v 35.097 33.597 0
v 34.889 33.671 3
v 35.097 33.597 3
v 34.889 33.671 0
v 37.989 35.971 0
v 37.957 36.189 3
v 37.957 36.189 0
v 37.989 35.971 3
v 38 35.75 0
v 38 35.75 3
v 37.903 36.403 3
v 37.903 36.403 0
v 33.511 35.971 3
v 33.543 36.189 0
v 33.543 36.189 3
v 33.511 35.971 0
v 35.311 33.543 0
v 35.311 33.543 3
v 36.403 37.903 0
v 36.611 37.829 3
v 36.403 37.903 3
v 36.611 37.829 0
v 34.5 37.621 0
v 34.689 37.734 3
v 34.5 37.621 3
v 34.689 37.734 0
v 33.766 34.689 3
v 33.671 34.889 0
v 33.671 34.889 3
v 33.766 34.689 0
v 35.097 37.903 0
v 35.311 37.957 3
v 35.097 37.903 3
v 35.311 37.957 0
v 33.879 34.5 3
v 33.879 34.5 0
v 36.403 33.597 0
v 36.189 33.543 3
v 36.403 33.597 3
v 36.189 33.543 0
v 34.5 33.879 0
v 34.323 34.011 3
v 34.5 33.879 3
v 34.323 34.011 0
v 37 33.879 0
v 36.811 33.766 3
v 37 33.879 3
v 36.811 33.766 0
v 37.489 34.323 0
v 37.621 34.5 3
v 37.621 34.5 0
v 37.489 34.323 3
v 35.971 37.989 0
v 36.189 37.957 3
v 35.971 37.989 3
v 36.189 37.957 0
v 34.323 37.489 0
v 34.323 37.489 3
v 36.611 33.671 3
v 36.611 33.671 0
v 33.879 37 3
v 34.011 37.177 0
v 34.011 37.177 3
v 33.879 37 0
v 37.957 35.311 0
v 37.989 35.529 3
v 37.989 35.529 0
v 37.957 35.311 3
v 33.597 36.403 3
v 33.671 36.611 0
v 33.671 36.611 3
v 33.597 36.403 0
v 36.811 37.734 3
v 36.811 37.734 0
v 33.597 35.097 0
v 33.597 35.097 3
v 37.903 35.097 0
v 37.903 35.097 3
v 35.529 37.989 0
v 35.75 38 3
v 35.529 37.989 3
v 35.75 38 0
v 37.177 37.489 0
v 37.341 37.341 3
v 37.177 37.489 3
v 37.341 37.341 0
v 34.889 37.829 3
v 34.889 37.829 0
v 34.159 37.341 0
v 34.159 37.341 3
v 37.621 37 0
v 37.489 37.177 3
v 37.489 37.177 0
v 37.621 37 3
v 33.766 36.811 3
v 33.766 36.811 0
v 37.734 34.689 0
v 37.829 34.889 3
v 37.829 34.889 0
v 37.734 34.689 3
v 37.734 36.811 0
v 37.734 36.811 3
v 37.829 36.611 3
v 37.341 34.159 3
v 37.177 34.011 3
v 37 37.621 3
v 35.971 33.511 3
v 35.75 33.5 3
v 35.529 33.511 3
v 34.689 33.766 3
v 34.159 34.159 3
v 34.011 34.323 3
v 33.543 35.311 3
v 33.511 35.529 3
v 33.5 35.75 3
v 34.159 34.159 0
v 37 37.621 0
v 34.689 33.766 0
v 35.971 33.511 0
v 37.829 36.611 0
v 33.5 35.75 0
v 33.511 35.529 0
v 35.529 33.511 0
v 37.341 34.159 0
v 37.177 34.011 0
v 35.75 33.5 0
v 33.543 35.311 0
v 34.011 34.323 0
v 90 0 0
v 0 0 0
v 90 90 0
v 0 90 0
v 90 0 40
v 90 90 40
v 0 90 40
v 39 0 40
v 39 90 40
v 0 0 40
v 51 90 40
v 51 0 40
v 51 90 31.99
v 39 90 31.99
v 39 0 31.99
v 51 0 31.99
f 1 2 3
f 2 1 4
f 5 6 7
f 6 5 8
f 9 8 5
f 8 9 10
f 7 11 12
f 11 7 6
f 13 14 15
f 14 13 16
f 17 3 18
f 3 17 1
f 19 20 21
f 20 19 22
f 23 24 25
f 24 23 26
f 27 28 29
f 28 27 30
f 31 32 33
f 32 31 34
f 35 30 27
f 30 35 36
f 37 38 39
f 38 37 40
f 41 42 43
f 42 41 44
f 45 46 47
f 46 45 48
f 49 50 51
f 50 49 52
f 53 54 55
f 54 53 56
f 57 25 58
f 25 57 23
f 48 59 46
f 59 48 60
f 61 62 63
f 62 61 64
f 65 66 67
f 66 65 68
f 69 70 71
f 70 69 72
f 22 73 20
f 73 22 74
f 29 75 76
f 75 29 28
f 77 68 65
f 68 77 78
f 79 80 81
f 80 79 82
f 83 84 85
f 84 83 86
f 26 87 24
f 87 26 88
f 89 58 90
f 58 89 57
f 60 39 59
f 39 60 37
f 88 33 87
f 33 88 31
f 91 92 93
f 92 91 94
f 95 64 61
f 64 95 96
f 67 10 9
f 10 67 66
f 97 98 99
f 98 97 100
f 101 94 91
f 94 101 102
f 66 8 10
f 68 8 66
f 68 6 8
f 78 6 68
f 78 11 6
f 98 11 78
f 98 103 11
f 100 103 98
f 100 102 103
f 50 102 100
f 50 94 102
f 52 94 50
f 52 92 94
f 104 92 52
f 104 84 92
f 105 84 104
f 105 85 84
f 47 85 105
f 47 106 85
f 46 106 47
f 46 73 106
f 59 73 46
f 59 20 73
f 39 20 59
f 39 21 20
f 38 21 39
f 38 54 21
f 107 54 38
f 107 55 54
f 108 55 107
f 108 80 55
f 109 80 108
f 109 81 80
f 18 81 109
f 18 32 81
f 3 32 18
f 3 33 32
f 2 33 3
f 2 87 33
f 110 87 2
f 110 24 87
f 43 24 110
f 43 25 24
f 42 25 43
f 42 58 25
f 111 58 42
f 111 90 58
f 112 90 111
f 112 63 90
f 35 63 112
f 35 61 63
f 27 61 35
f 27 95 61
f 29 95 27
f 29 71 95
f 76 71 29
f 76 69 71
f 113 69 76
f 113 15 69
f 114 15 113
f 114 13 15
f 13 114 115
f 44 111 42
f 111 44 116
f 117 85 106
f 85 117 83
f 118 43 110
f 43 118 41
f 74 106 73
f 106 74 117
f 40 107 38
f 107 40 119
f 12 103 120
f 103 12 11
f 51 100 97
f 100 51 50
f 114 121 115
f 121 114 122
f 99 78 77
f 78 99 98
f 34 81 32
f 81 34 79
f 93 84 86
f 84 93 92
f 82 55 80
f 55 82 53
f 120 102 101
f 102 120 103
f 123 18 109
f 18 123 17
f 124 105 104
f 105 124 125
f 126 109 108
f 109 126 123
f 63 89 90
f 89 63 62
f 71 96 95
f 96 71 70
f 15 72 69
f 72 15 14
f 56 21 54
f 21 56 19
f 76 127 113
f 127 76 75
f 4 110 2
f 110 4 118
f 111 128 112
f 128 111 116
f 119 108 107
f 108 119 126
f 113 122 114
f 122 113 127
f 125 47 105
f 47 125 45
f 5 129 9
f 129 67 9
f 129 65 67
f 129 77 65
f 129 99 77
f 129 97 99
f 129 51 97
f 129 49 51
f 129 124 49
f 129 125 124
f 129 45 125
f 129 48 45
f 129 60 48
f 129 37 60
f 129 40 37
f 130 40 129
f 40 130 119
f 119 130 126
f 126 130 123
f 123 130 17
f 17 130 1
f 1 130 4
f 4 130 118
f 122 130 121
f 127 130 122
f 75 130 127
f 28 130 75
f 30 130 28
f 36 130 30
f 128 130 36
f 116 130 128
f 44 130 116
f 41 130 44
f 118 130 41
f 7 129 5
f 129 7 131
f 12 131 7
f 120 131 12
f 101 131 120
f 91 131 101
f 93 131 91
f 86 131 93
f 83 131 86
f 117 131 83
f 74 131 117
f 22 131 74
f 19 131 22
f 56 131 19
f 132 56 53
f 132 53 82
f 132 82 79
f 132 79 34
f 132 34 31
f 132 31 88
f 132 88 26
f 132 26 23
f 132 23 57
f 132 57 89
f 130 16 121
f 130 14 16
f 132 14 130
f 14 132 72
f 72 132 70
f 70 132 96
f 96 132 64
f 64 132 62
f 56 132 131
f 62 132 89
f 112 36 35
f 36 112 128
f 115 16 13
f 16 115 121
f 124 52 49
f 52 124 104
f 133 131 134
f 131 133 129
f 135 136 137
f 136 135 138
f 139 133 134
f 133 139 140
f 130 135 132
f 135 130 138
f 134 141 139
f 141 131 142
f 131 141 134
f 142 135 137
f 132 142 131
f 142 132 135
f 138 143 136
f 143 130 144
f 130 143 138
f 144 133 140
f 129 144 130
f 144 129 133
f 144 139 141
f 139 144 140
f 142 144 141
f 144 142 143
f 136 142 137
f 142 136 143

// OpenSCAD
// DIY Magnetic Stirrer Housing - built upside down on the print bed.
// Top plate (z=0 to 2) with screw holes, four walls (z=2 to 40), and a cable notch.

// Dimensions
outer_x = 90;
outer_y = 90;
top_thickness = 2;
wall_thickness = 2.5;
total_height = 40;
wall_height = total_height - top_thickness;

// Screw hole pattern
screw_hole_d = 4.5;
screw_pattern_size = 71.5;
screw_hole_z = top_thickness; // Depth of cut into the top plate

// Cable notch
notch_width = 12;
notch_depth = 8; // From open edge (z=40) down to z=32

$fn = 64;

// Main body: Top plate + 4 walls
// We build the solid block first, then subtract holes and notch.
// The block is 90x90x40.
difference() {
    // 1. The solid block
    translate([0, 0, 0]) cube([outer_x, outer_y, total_height]);

    // 2. Screw holes in the top plate
    // Pattern: 4 holes on a 71.5mm square centered on the plate.
    // Positions: +/- (71.5/2) from center.
    for (i = [-1, 1]) {
        for (j = [-1, 1]) {
            translate([
                i * (screw_pattern_size / 2),
                j * (screw_pattern_size / 2),
                0
            ]) cylinder(h = top_thickness + 1, d = screw_hole_d);
        }
    }

    // 3. Cable notch in one wall
    // The notch is in the wall at X = outer_x / 2 (right wall).
    // It is 12mm wide, centered along the wall (Y direction).
    // It reaches 8mm down from the open edge (z=40), so from z=32 to z=40.
    // We cut a rectangular prism extending slightly past the wall thickness.
    translate([
        outer_x / 2 - notch_width / 2,
        0,
        total_height - notch_depth - 0.01 // Extend slightly past the top face to ensure clean cut
    ]) cube([notch_width, outer_y + 2, notch_depth + 0.01]);
}
